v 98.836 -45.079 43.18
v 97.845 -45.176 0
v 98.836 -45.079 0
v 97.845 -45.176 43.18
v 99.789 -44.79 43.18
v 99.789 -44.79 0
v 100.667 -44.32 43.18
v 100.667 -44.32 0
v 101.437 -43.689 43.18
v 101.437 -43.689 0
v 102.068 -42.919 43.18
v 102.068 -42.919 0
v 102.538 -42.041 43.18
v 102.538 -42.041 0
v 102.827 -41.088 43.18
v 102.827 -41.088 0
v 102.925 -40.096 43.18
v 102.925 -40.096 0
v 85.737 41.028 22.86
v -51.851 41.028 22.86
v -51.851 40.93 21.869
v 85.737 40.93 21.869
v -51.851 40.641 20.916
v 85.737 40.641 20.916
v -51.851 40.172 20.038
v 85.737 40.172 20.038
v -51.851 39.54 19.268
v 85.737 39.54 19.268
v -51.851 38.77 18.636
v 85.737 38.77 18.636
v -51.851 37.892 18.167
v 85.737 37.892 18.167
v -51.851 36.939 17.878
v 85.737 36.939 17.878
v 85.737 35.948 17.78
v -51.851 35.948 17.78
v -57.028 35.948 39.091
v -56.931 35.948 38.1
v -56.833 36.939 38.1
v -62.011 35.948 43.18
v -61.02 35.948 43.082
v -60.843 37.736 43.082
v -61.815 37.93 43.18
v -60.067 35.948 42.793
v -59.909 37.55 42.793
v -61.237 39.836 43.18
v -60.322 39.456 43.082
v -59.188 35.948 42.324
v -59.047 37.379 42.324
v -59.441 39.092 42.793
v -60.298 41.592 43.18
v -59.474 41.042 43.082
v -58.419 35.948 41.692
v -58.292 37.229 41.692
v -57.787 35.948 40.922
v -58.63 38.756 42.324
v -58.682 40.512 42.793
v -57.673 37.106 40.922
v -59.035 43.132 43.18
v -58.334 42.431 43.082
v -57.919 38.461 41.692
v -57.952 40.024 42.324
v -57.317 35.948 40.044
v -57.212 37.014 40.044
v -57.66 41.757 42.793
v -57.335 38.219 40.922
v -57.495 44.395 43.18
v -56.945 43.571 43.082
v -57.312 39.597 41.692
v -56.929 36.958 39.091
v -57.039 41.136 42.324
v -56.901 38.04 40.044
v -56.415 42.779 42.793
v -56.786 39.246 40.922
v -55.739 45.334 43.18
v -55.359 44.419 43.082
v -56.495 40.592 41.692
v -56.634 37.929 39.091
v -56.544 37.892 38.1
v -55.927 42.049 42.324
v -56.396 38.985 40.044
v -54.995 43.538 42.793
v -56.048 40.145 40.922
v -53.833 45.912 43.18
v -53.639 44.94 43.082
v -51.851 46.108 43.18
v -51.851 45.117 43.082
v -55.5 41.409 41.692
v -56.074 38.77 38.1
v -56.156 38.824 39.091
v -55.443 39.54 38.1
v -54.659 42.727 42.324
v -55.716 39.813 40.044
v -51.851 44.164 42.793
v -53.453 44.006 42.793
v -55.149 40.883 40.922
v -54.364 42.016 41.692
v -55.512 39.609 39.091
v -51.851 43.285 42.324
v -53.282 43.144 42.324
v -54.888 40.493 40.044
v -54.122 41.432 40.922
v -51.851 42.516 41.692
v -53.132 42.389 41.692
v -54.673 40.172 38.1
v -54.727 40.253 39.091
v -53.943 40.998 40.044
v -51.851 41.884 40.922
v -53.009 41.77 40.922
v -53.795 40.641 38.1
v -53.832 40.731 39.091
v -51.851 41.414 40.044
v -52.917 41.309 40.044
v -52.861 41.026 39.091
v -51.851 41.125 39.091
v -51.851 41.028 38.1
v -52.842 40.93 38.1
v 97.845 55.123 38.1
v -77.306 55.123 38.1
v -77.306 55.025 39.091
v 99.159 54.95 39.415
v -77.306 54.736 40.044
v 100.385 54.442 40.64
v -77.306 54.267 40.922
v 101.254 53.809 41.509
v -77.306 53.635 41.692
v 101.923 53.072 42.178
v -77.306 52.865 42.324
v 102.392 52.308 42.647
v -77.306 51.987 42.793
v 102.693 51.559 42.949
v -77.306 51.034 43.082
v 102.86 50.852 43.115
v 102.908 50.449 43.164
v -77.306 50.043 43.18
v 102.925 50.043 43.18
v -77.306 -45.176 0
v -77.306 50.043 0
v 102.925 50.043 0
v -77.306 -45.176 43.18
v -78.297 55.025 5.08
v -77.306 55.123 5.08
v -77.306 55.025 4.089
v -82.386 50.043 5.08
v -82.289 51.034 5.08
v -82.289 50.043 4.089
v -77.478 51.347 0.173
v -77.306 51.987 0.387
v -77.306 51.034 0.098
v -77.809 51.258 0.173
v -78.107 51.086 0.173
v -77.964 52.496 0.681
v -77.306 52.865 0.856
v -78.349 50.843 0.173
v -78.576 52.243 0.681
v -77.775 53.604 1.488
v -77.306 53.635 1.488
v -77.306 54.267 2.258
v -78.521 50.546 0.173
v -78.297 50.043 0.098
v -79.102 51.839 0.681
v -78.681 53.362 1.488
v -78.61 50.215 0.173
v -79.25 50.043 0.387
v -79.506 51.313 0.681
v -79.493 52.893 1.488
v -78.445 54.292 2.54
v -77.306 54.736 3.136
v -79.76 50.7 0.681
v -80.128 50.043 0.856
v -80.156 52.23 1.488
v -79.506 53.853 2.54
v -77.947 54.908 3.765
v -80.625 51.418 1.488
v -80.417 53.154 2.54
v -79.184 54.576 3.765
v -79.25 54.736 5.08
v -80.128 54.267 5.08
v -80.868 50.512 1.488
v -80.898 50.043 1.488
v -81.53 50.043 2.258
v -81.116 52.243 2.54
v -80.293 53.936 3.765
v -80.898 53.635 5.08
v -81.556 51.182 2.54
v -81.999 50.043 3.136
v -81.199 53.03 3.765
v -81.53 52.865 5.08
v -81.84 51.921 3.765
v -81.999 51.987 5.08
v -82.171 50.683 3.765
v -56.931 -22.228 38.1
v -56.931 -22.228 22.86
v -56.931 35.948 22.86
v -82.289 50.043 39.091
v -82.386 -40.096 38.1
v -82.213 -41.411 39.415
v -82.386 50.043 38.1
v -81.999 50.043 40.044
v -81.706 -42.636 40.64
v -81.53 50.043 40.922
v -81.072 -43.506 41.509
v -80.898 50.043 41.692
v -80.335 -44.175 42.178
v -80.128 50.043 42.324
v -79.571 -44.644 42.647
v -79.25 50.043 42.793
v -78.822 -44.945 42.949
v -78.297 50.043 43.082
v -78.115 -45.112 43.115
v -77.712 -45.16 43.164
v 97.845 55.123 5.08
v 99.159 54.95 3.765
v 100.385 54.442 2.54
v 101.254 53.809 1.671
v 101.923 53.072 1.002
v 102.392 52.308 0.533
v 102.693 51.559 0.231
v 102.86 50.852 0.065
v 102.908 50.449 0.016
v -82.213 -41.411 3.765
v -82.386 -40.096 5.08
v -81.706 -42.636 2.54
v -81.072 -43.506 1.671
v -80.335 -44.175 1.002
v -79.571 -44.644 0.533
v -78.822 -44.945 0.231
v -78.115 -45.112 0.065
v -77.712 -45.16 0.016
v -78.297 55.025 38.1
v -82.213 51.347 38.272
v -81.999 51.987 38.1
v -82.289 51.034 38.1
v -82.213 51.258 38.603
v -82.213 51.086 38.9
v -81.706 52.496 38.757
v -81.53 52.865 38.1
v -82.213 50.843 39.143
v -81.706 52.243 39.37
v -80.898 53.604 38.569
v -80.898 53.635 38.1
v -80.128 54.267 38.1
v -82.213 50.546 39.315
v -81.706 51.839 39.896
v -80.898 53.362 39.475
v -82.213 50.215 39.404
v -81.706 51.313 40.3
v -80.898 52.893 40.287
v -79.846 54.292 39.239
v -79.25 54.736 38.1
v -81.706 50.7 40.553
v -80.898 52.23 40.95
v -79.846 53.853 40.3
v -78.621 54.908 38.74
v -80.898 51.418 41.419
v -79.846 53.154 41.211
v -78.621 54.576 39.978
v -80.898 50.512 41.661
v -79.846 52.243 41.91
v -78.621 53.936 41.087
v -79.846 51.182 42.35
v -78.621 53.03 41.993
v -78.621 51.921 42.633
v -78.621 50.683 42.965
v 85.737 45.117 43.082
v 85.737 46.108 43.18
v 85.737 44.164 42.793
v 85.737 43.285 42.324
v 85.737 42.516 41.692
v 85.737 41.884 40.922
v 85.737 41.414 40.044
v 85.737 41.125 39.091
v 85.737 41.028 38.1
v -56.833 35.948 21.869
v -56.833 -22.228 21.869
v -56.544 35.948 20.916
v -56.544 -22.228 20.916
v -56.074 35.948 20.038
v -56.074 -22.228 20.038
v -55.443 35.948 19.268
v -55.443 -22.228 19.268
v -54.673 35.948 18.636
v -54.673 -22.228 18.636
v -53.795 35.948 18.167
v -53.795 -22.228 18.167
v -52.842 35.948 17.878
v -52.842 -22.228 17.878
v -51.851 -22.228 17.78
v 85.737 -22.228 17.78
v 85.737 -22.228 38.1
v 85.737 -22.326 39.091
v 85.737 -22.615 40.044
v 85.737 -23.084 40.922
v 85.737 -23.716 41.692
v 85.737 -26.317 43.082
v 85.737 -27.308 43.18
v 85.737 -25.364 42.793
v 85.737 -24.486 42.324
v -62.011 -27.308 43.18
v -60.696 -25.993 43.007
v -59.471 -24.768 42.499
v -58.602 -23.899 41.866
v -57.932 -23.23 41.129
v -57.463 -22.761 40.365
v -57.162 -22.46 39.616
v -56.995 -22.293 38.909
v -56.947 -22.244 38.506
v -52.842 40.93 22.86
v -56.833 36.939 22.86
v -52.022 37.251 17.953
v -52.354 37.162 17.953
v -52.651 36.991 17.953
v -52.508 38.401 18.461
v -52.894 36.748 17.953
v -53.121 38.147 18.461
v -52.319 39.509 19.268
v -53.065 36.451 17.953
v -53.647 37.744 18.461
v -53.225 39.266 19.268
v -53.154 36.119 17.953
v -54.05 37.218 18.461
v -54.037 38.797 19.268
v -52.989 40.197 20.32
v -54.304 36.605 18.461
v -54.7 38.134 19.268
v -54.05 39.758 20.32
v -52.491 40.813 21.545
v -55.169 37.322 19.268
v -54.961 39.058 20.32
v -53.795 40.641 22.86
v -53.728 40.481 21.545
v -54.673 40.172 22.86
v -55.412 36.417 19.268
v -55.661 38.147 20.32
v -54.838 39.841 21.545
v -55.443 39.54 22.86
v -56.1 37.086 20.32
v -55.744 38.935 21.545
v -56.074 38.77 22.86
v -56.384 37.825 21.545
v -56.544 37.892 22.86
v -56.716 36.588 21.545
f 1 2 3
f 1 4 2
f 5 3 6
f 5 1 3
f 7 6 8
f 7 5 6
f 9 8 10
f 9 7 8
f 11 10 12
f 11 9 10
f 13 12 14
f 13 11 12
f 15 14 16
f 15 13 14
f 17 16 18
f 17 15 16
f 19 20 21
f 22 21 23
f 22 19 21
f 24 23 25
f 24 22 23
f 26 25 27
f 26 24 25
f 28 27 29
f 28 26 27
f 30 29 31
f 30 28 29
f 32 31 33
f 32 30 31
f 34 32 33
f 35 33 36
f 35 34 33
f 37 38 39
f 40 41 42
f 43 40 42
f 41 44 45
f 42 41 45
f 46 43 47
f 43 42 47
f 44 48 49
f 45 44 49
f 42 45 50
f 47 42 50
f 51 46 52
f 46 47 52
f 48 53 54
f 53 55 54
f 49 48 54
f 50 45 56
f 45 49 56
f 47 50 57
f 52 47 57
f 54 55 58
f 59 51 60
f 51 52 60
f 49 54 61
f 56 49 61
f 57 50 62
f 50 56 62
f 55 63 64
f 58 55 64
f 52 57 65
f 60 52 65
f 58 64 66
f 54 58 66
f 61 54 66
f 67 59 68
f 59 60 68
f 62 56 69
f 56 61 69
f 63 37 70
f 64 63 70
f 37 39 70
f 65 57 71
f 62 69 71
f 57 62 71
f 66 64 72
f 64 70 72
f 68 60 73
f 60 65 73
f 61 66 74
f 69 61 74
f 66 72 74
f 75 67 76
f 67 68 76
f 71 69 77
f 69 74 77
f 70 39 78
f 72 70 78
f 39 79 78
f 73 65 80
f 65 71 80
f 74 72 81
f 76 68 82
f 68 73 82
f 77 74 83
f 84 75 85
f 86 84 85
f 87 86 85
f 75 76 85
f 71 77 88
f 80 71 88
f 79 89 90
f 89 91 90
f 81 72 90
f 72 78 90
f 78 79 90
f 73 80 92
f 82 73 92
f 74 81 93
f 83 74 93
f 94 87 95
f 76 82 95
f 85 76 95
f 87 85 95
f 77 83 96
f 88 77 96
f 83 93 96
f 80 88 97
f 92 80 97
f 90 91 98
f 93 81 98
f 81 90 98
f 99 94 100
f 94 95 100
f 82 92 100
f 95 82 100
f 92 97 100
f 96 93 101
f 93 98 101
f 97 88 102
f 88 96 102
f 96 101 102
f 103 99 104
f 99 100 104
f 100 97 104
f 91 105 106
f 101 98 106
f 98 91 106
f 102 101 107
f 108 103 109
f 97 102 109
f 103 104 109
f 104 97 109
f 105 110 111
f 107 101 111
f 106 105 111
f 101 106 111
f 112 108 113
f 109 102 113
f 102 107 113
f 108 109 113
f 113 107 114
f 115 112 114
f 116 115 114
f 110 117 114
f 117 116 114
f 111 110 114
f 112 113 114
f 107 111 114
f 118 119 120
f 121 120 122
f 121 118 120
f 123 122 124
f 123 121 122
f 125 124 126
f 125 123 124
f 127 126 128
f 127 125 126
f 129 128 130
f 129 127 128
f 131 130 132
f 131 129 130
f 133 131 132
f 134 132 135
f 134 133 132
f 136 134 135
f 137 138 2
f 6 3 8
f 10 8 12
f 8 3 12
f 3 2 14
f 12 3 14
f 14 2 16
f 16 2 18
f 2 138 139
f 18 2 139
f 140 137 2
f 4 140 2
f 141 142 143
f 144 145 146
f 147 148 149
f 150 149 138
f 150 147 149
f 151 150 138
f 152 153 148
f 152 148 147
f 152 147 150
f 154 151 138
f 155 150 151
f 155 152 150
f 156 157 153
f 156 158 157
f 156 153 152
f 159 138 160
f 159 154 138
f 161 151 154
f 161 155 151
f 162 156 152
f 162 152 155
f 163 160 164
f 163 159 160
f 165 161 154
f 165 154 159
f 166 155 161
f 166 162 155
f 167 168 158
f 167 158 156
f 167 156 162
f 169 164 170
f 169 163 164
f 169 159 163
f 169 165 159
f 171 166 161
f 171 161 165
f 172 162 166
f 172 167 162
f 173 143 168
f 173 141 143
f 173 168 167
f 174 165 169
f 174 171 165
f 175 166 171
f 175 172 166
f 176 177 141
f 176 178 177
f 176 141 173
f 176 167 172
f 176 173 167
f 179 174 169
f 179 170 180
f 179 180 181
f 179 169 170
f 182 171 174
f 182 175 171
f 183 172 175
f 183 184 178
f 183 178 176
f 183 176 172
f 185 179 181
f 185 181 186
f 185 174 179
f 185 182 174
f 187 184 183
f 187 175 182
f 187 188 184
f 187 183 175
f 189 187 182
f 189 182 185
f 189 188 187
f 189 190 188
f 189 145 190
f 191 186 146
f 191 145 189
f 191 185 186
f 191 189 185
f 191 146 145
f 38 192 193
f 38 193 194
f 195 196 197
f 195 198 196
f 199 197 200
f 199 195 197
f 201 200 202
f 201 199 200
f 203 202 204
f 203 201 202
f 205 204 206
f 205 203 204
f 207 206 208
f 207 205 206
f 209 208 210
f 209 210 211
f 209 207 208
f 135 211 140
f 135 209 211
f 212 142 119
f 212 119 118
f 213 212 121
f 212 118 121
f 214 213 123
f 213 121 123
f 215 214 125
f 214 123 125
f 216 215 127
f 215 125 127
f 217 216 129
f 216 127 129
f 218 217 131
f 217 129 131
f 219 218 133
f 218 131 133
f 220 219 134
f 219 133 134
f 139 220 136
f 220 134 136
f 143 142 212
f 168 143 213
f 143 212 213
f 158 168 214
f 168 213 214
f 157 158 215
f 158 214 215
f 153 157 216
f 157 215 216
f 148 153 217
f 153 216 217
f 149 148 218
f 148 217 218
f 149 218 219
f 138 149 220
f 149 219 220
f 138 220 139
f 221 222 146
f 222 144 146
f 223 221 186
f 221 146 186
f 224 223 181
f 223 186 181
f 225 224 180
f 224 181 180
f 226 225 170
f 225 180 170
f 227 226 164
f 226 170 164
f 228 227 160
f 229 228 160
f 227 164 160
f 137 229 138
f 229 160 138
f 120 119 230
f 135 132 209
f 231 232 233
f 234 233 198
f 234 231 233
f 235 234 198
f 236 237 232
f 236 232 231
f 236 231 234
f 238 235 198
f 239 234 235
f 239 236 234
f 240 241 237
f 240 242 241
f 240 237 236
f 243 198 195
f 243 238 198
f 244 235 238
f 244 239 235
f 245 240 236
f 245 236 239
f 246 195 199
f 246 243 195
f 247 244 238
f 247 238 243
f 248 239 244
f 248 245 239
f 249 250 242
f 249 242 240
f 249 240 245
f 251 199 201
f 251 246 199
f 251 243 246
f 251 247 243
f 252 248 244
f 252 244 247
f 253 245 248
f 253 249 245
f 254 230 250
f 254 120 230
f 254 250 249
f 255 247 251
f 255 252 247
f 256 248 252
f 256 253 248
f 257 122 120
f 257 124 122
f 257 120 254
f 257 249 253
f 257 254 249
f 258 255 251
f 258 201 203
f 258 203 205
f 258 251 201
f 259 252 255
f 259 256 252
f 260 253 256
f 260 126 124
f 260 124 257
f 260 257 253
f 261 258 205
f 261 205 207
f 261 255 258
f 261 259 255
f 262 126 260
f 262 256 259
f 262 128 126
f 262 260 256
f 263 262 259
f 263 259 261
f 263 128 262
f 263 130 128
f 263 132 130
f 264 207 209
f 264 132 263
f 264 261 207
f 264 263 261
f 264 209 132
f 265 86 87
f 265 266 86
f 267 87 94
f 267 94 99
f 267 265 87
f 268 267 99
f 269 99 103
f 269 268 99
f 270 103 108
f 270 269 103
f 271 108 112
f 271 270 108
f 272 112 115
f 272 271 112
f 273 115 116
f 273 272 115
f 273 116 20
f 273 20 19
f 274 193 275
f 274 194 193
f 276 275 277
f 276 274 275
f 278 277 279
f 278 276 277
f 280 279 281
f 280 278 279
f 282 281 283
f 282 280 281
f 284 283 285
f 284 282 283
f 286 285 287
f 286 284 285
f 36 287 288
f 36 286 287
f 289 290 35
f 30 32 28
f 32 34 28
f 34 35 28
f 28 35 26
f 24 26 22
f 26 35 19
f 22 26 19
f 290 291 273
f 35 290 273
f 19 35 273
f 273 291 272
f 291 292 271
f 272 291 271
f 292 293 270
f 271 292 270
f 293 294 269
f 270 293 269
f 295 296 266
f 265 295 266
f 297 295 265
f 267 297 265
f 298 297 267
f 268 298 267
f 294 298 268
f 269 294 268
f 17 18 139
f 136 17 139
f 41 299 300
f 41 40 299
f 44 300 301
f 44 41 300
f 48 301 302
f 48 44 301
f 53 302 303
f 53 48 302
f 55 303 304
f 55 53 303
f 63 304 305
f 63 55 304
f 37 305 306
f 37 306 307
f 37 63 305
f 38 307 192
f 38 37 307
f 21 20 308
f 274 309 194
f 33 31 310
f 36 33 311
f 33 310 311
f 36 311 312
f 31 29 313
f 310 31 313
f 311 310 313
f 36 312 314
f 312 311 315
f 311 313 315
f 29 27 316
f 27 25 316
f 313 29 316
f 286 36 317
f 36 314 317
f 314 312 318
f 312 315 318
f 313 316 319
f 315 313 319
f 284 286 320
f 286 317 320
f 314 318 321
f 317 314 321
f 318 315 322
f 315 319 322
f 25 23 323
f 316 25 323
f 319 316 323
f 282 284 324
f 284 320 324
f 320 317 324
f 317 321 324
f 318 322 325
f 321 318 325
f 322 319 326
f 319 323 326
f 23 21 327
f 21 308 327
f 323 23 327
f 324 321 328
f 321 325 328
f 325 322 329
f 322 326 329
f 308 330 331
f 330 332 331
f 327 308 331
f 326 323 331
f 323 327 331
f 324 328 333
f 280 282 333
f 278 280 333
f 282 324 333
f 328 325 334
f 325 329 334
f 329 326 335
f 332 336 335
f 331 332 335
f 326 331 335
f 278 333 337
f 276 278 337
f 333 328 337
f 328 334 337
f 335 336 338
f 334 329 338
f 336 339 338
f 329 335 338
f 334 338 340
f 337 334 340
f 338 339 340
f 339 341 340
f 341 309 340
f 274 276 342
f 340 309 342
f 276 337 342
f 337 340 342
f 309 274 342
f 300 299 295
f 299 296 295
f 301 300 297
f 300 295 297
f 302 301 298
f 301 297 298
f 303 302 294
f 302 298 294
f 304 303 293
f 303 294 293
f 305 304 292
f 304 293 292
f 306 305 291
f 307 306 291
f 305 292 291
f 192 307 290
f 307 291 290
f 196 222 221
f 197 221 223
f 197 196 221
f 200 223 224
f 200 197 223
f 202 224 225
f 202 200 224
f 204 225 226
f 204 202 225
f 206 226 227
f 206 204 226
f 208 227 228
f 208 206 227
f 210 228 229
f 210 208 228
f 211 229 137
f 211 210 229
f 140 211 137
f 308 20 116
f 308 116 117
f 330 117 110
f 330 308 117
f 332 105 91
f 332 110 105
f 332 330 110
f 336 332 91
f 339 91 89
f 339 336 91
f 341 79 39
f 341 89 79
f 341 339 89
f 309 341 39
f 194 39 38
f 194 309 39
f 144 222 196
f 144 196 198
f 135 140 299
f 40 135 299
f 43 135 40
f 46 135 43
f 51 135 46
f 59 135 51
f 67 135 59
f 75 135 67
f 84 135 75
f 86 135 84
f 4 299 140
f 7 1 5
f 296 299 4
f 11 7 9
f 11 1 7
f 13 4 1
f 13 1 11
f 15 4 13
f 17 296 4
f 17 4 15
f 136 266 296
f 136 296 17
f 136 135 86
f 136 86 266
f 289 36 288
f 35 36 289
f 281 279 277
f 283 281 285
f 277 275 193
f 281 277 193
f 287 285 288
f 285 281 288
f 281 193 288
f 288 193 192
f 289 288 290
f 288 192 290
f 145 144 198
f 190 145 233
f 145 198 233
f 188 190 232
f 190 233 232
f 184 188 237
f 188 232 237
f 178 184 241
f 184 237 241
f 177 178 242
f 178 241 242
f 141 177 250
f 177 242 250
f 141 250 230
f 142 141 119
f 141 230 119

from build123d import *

# Parameters (mm, degrees)
F0_W     = 185.310639
F0_H     = 100.29944
F1_DEPTH = 43.18
F2_W     = 142.667748
F2_H     = 63.255836
F3_DEPTH = 25.4
F4_R     = 5.08


with BuildPart() as f1:
    # F0 (on Top) → F1 (new body)
    with BuildSketch(Plane.XY):
        with Locations((10.269184, 4.973244)):
            Rectangle(F0_W, F0_H)
    extrude(amount=F1_DEPTH)

    # F2 (on face) → F3 (cut)
    with BuildSketch(Plane.XY.offset(43.18)):
        with Locations((14.403265, 9.399725)):
            Rectangle(F2_W, F2_H)
    extrude(amount=-F3_DEPTH, mode=Mode.SUBTRACT)

    # F4
    f4_edges = [f1.edges().sort_by_distance(p)[0] for p in [
        (-82.386136, -45.176476, 21.59),
        (102.924503, -45.176476, 21.59),
        (102.924503, 55.122964, 21.59),
        (10.269184, 55.122964, 43.18),
        (14.403265, 41.027643, 43.18),
        (-82.386136, 55.122964, 21.59),
        (-56.930609, 41.027643, 30.48),
        (14.403265, -22.228193, 43.18),
        (14.403265, 41.027643, 17.78),
        (-56.930609, 9.399725, 43.18),
        (-56.930609, 9.399725, 17.78),
        (10.269184, 55.122964, 0),
        (-82.386136, 4.973244, 43.18),
        (-82.386136, 4.973244, 0),
    ]]
    fillet(f4_edges, radius=F4_R)


solid = f1.part
